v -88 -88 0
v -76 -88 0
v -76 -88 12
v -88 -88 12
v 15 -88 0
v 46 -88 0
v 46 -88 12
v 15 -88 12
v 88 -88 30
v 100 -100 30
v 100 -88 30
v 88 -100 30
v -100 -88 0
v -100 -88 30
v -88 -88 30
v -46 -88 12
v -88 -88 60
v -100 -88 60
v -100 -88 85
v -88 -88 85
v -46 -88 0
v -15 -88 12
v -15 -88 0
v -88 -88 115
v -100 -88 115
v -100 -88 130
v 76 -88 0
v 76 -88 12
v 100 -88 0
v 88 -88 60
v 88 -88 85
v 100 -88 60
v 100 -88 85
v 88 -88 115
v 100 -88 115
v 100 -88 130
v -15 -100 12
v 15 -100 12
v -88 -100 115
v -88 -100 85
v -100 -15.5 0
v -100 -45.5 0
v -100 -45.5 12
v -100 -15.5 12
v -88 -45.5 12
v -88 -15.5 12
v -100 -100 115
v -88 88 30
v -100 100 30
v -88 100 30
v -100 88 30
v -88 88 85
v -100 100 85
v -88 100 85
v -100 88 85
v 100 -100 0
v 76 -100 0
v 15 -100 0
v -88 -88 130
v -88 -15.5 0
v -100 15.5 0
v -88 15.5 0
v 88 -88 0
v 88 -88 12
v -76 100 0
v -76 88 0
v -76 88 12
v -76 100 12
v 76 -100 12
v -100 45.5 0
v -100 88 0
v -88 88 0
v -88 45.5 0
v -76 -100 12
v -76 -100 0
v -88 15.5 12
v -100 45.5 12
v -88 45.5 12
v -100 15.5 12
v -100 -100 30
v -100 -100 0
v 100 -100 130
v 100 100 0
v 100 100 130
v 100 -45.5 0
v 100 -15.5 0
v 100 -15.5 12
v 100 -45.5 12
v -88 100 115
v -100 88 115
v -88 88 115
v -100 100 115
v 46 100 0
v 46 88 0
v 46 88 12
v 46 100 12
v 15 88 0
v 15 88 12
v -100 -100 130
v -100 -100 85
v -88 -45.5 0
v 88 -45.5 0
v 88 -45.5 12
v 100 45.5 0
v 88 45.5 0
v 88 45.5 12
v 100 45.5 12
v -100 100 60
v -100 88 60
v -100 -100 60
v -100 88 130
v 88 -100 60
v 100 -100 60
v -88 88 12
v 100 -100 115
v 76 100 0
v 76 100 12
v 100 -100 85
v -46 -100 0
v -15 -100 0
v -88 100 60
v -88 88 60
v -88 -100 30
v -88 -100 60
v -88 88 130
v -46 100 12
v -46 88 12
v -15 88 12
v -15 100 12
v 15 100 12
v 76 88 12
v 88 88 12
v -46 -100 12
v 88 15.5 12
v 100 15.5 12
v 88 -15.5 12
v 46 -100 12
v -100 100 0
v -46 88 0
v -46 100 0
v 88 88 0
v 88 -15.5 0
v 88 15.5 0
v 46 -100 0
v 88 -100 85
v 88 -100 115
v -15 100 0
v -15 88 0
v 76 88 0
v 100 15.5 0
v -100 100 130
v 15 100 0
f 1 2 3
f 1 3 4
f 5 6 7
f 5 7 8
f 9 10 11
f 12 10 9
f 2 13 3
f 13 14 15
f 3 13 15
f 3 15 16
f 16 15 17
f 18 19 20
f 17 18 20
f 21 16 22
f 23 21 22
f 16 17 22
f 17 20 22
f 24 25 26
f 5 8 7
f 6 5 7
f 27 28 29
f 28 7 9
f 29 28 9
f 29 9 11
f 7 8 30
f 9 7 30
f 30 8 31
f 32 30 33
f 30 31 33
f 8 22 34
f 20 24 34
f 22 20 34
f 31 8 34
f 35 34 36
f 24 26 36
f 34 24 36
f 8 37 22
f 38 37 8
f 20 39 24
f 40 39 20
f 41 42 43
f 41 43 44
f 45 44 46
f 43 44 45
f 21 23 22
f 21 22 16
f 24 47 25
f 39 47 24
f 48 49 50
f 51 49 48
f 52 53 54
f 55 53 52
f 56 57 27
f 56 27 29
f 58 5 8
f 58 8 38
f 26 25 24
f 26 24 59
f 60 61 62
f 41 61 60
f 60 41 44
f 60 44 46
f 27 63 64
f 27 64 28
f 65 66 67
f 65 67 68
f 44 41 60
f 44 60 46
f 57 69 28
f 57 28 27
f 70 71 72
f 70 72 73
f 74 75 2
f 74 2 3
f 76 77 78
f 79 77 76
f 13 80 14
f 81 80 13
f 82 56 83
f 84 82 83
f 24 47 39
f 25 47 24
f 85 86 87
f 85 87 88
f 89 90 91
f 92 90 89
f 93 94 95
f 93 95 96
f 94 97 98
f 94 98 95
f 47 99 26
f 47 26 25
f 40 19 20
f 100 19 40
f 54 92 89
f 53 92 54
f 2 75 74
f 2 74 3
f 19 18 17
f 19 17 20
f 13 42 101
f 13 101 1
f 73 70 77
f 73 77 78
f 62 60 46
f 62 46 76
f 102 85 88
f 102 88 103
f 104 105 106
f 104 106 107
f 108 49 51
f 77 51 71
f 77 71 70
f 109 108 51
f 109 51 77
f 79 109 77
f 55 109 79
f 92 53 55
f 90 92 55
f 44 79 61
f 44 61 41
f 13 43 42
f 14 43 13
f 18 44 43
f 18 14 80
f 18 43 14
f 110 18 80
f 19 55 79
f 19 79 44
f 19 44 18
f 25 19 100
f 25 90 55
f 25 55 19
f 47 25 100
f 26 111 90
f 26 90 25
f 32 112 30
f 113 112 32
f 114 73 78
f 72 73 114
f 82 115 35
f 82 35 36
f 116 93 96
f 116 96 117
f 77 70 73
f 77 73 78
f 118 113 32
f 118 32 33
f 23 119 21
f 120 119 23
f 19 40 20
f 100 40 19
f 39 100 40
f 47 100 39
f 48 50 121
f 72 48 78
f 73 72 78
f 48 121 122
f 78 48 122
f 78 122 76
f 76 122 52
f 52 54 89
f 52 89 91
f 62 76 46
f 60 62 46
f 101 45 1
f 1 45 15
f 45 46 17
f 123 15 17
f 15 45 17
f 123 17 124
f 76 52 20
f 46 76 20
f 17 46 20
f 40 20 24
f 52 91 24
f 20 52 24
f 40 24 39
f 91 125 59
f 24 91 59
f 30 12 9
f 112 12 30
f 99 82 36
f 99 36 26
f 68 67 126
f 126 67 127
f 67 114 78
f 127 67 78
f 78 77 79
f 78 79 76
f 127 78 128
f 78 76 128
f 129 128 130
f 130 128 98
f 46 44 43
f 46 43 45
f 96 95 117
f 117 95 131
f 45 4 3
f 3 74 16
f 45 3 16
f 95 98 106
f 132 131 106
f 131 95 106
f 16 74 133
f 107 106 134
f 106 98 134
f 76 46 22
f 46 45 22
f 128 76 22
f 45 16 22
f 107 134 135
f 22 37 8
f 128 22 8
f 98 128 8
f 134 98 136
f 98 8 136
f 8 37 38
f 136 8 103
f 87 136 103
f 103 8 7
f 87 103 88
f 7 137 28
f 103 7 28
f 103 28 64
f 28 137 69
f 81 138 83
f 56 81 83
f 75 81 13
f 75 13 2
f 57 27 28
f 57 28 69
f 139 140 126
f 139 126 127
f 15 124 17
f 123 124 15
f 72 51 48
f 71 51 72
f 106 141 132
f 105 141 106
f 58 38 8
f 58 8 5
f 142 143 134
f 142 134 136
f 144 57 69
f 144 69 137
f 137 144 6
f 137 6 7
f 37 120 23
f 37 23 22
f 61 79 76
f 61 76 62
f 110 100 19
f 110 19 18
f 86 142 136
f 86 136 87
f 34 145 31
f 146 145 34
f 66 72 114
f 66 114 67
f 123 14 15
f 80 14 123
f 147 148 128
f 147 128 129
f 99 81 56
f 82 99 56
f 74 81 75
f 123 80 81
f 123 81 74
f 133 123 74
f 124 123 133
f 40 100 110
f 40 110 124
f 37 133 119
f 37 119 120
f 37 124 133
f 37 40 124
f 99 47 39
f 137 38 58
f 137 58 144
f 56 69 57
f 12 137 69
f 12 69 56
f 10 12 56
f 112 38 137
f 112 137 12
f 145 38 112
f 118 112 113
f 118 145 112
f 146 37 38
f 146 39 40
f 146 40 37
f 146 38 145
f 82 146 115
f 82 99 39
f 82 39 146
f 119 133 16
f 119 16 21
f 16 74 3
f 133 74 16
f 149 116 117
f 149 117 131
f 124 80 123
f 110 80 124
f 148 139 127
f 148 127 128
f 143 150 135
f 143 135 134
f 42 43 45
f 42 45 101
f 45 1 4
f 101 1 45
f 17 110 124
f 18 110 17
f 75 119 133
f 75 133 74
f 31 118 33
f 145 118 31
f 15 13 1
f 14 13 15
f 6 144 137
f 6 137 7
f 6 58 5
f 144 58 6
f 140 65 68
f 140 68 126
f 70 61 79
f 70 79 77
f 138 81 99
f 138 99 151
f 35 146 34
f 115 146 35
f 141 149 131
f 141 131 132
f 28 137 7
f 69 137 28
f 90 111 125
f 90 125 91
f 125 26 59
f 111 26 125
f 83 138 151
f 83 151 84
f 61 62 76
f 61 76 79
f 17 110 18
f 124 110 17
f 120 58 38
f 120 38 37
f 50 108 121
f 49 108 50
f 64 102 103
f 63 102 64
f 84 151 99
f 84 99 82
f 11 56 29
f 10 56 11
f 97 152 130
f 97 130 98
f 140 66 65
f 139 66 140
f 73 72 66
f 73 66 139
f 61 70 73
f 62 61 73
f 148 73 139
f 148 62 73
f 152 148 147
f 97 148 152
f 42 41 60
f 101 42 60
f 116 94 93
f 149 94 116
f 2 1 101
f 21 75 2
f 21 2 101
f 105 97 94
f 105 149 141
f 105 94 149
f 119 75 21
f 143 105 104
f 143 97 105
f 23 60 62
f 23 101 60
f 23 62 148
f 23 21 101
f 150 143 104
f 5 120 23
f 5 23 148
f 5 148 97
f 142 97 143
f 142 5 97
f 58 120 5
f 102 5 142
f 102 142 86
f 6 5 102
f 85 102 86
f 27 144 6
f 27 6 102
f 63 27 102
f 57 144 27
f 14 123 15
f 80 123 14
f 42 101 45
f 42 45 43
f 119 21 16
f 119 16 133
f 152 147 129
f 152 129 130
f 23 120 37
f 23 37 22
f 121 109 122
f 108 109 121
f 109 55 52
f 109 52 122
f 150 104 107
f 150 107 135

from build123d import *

# Parameters (mm, degrees)
F0_W     = 200
F0_H     = 200
F0_W_2   = 61.817065
F0_H_2   = 48.289645
F1_DEPTH = 130
F3_DEPTH = 12
F5_DEPTH = 12
F7_DEPTH = 12


with BuildPart() as f1:
    # F0 (on Top) → F1 (new body)
    with BuildSketch(Plane.XY):
        Rectangle(F0_W, F0_H)
        with Locations((-45.024239, 3.057866)):
            Rectangle(F0_W_2, F0_H_2, mode=Mode.SUBTRACT)
        with Locations((-45.024239, 3.057866)):
            Rectangle(F0_W_2, F0_H_2)
    extrude(amount=F1_DEPTH)


with BuildPart() as f3:
    # F2 (on face) → F3 (new body)
    with BuildSketch(Plane(origin=(0, 0, 0), x_dir=(1, 0, 0), z_dir=(0, 0, -1))):
        Polygon((88, 45.5), (88, 88), (76, 88), (76, 100), (46, 100), (46, 88), (15, 88), (15, 100), (-15, 100), (-15, 88), (-46, 88), (-46, 100), (-76, 100), (-76, 88), (-88, 88), (-88, 45.5), (-100, 45.5), (-100, 15.5), (-88, 15.5), (-88, -15.5), (-100, -15.5), (-100, -45.5), (-88, -45.5), (-88, -88), (-76, -88), (-76, -100), (-46, -100), (-46, -88), (-15, -88), (-15, -100), (15, -100), (15, -88), (46, -88), (46, -100), (76, -100), (76, -88), (88, -88), (88, -45.5), (100, -45.5), (100, -15.5), (88, -15.5), (88, 15.5), (100, 15.5), (100, 45.5), align=None)
    extrude(amount=-F3_DEPTH)


with BuildPart() as f5:
    # F4 (on face) → F5 (new body)
    with BuildSketch(Plane.XZ.offset(100)):
        Polygon((-76, 0), (-76, 12), (-46, 12), (-46, 0), (-15, 0), (-15, 12), (15, 12), (15, 0), (46, 0), (46, 12), (76, 12), (76, 0), (100, 0), (100, 30), (88, 30), (88, 60), (100, 60), (100, 85), (88, 85), (88, 115), (100, 115), (100, 130), (-100, 130), (-100, 115), (-88, 115), (-88, 85), (-100, 85), (-100, 60), (-88, 60), (-88, 30), (-100, 30), (-100, 0), align=None)
    extrude(amount=-F5_DEPTH)


with BuildPart() as f7:
    # F6 (on face) → F7 (new body)
    with BuildSketch(Plane(origin=(-100, 0, 0), x_dir=(0, -1, 0), z_dir=(-1, 0, 0))):
        Polygon((88, 130), (0, 130), (0, 0), (15.5, 0), (15.5, 12), (45.5, 12), (45.5, 0), (88, 0), (88, 30), (100, 30), (100, 60), (88, 60), (88, 85), (100, 85), (100, 115), (88, 115), align=None)
        Polygon((0, 0), (0, 130), (-88, 130), (-88, 115), (-100, 115), (-100, 85), (-88, 85), (-88, 60), (-100, 60), (-100, 30), (-88, 30), (-88, 0), (-45.5, 0), (-45.5, 12), (-15.5, 12), (-15.5, 0), align=None)
    extrude(amount=-F7_DEPTH)


solid = Compound([f1.part, f3.part, f5.part, f7.part])
